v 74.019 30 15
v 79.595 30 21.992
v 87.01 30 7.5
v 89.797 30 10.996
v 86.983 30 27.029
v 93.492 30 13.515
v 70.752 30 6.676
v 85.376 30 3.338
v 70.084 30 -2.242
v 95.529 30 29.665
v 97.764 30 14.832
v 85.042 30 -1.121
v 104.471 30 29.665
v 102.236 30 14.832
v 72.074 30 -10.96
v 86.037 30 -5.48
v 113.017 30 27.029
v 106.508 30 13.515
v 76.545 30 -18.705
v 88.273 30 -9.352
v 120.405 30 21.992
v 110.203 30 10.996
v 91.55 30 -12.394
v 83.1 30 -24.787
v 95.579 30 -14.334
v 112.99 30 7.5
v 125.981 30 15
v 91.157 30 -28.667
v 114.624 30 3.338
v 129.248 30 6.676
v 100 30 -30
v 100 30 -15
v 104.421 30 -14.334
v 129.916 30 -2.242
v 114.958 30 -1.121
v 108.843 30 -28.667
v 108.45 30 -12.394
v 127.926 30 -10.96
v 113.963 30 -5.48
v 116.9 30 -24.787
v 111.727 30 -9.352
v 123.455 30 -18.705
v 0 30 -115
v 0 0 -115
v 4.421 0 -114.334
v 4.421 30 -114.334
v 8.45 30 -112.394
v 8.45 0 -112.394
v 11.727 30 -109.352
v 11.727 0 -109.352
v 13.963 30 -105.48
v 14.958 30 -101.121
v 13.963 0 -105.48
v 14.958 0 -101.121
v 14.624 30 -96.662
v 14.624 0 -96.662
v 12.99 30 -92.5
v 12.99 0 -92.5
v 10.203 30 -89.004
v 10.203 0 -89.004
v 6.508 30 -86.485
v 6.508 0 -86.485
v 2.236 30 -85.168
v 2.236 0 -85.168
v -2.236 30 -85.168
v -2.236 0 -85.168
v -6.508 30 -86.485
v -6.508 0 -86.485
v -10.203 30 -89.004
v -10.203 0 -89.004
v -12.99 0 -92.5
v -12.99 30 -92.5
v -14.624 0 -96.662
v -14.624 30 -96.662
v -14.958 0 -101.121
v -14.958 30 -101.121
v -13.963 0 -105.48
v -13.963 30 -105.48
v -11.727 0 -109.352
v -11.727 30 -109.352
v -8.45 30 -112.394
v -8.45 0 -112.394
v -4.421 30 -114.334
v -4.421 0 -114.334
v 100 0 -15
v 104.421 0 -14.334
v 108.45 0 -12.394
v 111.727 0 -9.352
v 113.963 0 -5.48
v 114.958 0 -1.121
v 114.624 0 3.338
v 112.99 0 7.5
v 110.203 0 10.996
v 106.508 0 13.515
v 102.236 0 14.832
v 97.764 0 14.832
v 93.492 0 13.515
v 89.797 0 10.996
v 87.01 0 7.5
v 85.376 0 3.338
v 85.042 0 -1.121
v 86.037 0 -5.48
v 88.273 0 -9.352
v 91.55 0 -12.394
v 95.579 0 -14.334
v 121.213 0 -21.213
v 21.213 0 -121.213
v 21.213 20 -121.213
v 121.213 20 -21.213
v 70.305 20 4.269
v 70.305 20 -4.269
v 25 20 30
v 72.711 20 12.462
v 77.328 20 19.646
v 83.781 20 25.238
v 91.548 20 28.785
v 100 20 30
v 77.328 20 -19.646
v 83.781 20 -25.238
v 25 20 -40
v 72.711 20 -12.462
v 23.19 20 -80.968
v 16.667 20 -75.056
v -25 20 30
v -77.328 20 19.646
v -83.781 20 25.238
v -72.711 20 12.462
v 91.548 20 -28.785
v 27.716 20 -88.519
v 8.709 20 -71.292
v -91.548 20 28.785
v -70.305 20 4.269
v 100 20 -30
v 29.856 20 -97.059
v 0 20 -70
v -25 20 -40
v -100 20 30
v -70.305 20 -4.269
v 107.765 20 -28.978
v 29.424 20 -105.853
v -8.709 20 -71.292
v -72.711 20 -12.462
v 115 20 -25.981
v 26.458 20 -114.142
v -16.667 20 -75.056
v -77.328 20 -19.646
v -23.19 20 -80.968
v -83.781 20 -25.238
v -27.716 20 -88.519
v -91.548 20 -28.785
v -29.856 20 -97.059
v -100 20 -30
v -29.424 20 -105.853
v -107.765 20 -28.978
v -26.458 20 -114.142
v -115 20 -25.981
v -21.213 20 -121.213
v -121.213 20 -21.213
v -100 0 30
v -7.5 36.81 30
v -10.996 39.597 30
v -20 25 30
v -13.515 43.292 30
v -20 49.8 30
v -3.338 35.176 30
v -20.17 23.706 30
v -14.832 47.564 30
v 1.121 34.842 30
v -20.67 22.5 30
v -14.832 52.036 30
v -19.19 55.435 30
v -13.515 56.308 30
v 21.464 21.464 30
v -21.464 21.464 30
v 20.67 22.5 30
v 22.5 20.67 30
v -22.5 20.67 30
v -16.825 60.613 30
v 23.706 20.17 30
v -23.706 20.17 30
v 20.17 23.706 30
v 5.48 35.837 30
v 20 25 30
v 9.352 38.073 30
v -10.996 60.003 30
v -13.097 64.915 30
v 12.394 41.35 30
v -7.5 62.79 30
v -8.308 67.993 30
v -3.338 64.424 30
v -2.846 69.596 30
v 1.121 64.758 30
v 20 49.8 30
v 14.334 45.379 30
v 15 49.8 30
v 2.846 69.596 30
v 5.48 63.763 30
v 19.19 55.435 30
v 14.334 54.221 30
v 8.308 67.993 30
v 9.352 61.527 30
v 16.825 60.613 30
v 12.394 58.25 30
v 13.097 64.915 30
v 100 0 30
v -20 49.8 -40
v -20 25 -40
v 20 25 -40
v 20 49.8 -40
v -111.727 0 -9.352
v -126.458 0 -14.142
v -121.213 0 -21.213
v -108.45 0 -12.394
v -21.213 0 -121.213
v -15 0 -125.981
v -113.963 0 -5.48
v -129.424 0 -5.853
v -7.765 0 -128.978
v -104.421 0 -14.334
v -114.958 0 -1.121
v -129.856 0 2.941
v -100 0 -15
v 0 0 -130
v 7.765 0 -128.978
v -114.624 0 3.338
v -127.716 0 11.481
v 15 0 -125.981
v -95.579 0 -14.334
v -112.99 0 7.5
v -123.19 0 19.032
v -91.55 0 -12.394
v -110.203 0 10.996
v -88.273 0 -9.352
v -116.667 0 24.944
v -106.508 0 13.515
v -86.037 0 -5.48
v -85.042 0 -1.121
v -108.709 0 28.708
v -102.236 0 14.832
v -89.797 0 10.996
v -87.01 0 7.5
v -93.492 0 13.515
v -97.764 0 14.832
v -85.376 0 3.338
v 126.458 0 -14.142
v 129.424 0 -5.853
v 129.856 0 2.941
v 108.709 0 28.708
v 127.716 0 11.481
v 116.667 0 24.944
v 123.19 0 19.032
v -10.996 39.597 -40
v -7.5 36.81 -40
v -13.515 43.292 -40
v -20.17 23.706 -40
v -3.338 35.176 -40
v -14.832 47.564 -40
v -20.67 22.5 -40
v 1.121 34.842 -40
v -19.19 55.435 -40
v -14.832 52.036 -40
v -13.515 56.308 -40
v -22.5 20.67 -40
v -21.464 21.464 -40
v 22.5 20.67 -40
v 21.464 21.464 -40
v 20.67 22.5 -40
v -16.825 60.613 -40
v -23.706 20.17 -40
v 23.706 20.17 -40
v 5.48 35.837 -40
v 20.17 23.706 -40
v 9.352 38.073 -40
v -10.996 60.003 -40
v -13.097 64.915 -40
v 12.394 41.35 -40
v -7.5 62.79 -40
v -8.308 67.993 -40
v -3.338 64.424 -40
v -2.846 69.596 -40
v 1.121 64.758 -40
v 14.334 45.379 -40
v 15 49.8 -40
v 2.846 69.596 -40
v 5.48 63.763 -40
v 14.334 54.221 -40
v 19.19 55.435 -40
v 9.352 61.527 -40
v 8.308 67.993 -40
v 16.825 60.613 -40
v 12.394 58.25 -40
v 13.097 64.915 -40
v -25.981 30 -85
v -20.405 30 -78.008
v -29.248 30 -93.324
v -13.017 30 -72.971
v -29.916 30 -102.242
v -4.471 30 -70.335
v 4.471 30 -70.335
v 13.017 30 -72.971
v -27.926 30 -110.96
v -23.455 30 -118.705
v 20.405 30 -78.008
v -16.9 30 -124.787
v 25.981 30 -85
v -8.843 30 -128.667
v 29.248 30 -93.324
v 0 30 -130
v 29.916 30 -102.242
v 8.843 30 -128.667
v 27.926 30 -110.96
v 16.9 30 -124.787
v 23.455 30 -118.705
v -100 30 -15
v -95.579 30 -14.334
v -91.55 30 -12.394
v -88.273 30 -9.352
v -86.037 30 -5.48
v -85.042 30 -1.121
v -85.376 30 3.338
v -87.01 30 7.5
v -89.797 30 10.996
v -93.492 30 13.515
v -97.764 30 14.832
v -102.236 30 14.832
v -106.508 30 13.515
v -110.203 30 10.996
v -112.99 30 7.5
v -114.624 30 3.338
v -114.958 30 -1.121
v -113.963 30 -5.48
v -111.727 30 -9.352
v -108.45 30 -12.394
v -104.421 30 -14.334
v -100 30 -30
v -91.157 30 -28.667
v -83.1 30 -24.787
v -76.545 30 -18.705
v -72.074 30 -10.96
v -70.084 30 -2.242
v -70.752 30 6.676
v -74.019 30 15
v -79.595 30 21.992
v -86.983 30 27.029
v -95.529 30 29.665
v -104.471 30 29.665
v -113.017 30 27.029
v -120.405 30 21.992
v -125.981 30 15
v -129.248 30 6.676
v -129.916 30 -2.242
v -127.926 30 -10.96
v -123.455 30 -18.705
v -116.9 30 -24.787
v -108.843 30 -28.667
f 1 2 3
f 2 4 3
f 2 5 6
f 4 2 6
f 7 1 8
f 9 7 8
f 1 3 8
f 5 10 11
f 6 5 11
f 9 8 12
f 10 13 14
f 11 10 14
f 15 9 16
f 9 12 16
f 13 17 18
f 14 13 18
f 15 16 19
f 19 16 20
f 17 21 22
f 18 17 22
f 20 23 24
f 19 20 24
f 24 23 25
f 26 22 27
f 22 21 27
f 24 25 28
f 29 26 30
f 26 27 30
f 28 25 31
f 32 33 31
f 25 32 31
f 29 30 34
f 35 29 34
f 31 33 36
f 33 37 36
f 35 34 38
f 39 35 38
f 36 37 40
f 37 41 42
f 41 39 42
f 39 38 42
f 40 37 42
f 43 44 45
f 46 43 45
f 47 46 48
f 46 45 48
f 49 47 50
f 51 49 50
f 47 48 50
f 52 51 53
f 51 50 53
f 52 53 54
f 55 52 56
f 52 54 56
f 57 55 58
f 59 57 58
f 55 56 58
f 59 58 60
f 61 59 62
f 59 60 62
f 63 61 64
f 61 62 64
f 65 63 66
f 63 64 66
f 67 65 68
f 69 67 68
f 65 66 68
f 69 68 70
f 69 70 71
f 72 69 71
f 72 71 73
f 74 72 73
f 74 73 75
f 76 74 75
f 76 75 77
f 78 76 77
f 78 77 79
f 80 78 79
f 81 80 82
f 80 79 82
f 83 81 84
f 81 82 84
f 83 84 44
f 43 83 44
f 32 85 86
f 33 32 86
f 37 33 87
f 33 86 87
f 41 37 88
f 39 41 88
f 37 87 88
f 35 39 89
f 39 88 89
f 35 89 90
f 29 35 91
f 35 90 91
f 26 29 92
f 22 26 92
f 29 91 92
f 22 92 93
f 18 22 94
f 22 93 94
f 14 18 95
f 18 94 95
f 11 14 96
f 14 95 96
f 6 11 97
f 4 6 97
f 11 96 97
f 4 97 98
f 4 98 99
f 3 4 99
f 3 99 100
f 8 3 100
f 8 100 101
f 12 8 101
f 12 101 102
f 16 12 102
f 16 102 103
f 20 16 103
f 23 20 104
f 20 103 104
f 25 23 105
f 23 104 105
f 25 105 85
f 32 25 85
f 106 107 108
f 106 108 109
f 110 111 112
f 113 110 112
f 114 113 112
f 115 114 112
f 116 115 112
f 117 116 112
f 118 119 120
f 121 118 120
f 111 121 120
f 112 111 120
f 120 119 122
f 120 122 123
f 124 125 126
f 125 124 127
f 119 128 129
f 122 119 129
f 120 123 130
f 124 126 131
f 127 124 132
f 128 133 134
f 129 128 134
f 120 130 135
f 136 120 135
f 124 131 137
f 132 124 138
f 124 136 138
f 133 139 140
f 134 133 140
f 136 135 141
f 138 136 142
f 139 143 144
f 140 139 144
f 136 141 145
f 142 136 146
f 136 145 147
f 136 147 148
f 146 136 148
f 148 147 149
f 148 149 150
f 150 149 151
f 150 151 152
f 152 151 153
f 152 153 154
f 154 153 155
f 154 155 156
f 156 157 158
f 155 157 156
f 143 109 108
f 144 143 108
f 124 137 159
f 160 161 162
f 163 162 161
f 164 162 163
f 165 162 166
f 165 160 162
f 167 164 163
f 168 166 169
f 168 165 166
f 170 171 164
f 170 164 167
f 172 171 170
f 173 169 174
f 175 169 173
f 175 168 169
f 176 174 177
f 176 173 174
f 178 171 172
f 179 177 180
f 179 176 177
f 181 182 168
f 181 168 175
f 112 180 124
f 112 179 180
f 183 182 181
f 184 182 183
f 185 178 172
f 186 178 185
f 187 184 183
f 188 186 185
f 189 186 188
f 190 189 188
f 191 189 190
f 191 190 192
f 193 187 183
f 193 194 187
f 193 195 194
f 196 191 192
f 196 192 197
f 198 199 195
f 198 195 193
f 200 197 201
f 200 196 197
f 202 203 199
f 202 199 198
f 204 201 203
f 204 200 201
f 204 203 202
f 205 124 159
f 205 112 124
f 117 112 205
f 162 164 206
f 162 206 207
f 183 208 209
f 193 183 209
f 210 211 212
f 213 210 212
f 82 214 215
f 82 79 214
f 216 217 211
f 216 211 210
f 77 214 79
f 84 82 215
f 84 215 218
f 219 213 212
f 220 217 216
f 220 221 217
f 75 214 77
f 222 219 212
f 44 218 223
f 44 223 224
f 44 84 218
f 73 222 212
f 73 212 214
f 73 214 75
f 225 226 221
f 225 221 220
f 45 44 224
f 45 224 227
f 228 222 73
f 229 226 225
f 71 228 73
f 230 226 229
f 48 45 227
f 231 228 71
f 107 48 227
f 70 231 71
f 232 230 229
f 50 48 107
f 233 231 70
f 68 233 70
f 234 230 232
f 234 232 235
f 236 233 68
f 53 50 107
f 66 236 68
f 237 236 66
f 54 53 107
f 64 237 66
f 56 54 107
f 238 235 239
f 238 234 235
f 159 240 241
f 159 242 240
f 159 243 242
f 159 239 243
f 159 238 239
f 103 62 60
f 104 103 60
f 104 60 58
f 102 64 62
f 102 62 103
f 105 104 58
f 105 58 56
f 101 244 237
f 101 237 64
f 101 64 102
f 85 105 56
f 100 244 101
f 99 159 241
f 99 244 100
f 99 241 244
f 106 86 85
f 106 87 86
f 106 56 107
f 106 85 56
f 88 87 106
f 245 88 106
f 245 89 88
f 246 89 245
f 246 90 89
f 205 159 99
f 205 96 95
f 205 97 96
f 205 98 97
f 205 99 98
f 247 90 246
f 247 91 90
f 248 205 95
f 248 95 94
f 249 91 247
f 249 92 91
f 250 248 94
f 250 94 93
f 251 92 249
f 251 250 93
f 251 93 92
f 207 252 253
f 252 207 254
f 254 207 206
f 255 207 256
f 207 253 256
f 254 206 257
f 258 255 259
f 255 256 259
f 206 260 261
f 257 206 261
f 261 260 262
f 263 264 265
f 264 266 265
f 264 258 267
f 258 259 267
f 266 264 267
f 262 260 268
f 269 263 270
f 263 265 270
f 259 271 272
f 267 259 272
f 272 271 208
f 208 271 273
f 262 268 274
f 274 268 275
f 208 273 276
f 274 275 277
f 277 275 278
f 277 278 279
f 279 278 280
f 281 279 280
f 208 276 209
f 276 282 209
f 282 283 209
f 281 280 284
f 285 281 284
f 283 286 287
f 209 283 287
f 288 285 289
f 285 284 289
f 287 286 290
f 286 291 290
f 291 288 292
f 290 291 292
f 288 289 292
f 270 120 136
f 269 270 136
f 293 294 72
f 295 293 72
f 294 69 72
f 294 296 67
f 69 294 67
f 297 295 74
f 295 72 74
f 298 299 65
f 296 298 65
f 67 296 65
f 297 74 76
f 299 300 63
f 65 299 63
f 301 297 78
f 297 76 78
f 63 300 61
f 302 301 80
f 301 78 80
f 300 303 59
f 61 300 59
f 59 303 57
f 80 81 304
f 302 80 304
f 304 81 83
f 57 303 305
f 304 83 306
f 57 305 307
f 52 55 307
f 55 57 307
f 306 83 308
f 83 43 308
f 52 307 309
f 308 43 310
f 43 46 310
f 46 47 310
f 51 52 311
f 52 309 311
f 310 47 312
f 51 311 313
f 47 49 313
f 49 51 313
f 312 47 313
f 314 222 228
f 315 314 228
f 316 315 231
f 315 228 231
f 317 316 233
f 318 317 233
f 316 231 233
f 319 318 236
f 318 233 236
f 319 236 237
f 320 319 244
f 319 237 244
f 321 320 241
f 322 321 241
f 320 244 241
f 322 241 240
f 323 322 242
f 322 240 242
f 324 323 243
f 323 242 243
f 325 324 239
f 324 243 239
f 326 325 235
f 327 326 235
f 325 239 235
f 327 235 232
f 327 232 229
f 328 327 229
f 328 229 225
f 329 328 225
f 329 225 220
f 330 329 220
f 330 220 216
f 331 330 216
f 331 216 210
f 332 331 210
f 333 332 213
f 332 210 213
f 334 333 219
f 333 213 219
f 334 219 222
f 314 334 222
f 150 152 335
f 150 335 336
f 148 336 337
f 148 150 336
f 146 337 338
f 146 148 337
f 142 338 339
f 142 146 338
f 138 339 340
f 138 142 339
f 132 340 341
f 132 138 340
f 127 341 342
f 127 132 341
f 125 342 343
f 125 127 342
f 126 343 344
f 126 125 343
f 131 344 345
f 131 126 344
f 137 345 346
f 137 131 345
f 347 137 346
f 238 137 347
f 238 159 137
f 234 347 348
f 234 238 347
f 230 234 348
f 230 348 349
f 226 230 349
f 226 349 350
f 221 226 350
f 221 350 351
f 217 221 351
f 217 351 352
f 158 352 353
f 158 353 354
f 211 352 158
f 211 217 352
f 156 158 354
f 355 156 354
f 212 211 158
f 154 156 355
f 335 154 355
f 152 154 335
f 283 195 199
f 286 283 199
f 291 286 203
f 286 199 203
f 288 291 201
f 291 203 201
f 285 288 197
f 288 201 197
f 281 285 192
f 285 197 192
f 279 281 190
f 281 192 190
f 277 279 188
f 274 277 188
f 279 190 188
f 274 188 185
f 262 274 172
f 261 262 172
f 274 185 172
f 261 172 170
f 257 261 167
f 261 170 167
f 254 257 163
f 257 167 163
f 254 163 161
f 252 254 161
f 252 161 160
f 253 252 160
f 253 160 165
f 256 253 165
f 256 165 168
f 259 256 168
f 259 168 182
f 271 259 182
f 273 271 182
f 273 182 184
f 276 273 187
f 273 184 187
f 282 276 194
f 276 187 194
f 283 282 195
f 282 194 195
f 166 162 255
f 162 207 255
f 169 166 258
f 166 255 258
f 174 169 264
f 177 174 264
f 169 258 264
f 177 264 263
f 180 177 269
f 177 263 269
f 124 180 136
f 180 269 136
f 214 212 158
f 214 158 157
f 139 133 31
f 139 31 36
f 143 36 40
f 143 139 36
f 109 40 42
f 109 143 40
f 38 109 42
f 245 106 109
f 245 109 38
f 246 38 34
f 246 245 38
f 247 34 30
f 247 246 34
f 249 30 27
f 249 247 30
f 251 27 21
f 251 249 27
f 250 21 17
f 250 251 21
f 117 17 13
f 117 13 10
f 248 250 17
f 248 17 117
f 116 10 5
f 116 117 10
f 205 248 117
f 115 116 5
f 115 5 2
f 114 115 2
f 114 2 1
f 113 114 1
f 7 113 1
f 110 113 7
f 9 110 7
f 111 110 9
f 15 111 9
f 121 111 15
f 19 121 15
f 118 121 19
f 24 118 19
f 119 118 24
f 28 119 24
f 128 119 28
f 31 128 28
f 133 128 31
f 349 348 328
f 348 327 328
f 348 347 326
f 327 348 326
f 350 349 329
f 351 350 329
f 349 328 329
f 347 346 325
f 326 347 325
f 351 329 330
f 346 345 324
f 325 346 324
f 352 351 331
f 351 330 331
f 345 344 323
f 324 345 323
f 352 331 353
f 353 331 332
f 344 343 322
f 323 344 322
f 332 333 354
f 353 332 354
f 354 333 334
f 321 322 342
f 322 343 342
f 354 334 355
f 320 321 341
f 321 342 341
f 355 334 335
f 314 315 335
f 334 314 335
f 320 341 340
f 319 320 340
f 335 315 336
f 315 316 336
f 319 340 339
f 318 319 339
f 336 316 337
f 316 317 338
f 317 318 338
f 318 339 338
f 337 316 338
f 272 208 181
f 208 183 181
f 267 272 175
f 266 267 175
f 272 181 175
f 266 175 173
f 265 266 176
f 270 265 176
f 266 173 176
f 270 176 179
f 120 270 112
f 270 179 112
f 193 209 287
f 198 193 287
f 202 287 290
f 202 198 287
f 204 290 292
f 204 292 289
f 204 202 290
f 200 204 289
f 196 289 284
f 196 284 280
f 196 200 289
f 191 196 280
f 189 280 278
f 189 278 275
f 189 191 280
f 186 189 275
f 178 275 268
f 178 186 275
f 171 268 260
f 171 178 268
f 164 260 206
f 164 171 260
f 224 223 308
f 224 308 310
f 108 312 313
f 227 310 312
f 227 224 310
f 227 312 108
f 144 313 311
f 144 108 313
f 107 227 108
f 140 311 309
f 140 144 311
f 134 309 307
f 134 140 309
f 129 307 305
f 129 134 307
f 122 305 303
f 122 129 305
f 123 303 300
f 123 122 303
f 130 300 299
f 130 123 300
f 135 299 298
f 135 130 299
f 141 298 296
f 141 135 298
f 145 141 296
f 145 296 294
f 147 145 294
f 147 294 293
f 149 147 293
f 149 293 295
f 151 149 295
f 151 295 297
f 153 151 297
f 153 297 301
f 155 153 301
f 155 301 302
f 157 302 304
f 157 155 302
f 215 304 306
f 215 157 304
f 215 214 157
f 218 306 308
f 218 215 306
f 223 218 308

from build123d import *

# Parameters (mm, degrees)
BOSS_EXTRUDE2_DEPTH = 20
SKETCH3_R           = 30
SKETCH3_R_2         = 15
BOSS_EXTRUDE3_DEPTH = 30
SKETCH5_R           = 15
BOSS_EXTRUDE4_DEPTH = 70
FILLET1_R           = 5


with BuildPart() as part:
    # Sketch1 → Boss-Extrude2 (new body)
    with BuildSketch(Plane(origin=(0, 0, 0), x_dir=(1, 0, 0), z_dir=(0, 1, 0))):
        with BuildLine():
            Line((-121.213203436, 21.213203436), (-21.213203436, 121.213203436))
            ThreePointArc((-21.213203436, 121.213203436), (0, 70), (21.213203436, 121.213203436))
            Line((21.213203436, 121.213203436), (121.213203436, 21.213203436))
            ThreePointArc((121.213203436, 21.213203436), (72.283614025, 11.480502971), (100, -30))
            Line((100, -30), (-100, -30))
            ThreePointArc((-100, -30), (-72.283614025, 11.480502971), (-121.213203436, 21.213203436))
        make_face()
    extrude(amount=BOSS_EXTRUDE2_DEPTH)

    # Sketch3 → Boss-Extrude3 (add)
    # profile 1 of 3: a face of its own
    with BuildSketch(Plane.XZ):
        with Locations(Location((0, -100, 0), (0, 0, 270))):
            Circle(SKETCH3_R)
        with Locations(Location((0, -100, 0), (0, 0, 270))):
            Circle(SKETCH3_R_2, mode=Mode.SUBTRACT)
    # profile 2 of 3: a face of its own
    with BuildSketch(Plane.XZ):
        with Locations(Location((100, 0, 0), (0, 0, 270))):
            Circle(SKETCH3_R)
        with Locations(Location((100, 0, 0), (0, 0, 270))):
            Circle(SKETCH3_R_2, mode=Mode.SUBTRACT)
    # profile 3 of 3: a face of its own
    with BuildSketch(Plane.XZ):
        with Locations(Location((-100, 0, 0), (0, 0, 270))):
            Circle(SKETCH3_R)
        with Locations(Location((-100, 0, 0), (0, 0, 270))):
            Circle(SKETCH3_R_2, mode=Mode.SUBTRACT)
    extrude(amount=-BOSS_EXTRUDE3_DEPTH)

    # Sketch5 → Boss-Extrude4 (add)
    with BuildSketch(Plane.XY.offset(30)):
        with BuildLine():
            Line((-20, 49.8), (-20, 0))
            Line((-20, 0), (20, 0))
            Line((20, 0), (20, 49.8))
            ThreePointArc((20, 49.8), (0, 69.8), (-20, 49.8))
        make_face()
        with Locations((0, 49.8)):
            Circle(SKETCH5_R, mode=Mode.SUBTRACT)
    extrude(amount=-BOSS_EXTRUDE4_DEPTH)

    # Fillet1
    fillet1_edges = [part.edges().sort_by_distance(p)[0] for p in [
        (20, 20, -5),
        (-20, 20, -5),
    ]]
    fillet(fillet1_edges, radius=FILLET1_R)


solid = part.part
